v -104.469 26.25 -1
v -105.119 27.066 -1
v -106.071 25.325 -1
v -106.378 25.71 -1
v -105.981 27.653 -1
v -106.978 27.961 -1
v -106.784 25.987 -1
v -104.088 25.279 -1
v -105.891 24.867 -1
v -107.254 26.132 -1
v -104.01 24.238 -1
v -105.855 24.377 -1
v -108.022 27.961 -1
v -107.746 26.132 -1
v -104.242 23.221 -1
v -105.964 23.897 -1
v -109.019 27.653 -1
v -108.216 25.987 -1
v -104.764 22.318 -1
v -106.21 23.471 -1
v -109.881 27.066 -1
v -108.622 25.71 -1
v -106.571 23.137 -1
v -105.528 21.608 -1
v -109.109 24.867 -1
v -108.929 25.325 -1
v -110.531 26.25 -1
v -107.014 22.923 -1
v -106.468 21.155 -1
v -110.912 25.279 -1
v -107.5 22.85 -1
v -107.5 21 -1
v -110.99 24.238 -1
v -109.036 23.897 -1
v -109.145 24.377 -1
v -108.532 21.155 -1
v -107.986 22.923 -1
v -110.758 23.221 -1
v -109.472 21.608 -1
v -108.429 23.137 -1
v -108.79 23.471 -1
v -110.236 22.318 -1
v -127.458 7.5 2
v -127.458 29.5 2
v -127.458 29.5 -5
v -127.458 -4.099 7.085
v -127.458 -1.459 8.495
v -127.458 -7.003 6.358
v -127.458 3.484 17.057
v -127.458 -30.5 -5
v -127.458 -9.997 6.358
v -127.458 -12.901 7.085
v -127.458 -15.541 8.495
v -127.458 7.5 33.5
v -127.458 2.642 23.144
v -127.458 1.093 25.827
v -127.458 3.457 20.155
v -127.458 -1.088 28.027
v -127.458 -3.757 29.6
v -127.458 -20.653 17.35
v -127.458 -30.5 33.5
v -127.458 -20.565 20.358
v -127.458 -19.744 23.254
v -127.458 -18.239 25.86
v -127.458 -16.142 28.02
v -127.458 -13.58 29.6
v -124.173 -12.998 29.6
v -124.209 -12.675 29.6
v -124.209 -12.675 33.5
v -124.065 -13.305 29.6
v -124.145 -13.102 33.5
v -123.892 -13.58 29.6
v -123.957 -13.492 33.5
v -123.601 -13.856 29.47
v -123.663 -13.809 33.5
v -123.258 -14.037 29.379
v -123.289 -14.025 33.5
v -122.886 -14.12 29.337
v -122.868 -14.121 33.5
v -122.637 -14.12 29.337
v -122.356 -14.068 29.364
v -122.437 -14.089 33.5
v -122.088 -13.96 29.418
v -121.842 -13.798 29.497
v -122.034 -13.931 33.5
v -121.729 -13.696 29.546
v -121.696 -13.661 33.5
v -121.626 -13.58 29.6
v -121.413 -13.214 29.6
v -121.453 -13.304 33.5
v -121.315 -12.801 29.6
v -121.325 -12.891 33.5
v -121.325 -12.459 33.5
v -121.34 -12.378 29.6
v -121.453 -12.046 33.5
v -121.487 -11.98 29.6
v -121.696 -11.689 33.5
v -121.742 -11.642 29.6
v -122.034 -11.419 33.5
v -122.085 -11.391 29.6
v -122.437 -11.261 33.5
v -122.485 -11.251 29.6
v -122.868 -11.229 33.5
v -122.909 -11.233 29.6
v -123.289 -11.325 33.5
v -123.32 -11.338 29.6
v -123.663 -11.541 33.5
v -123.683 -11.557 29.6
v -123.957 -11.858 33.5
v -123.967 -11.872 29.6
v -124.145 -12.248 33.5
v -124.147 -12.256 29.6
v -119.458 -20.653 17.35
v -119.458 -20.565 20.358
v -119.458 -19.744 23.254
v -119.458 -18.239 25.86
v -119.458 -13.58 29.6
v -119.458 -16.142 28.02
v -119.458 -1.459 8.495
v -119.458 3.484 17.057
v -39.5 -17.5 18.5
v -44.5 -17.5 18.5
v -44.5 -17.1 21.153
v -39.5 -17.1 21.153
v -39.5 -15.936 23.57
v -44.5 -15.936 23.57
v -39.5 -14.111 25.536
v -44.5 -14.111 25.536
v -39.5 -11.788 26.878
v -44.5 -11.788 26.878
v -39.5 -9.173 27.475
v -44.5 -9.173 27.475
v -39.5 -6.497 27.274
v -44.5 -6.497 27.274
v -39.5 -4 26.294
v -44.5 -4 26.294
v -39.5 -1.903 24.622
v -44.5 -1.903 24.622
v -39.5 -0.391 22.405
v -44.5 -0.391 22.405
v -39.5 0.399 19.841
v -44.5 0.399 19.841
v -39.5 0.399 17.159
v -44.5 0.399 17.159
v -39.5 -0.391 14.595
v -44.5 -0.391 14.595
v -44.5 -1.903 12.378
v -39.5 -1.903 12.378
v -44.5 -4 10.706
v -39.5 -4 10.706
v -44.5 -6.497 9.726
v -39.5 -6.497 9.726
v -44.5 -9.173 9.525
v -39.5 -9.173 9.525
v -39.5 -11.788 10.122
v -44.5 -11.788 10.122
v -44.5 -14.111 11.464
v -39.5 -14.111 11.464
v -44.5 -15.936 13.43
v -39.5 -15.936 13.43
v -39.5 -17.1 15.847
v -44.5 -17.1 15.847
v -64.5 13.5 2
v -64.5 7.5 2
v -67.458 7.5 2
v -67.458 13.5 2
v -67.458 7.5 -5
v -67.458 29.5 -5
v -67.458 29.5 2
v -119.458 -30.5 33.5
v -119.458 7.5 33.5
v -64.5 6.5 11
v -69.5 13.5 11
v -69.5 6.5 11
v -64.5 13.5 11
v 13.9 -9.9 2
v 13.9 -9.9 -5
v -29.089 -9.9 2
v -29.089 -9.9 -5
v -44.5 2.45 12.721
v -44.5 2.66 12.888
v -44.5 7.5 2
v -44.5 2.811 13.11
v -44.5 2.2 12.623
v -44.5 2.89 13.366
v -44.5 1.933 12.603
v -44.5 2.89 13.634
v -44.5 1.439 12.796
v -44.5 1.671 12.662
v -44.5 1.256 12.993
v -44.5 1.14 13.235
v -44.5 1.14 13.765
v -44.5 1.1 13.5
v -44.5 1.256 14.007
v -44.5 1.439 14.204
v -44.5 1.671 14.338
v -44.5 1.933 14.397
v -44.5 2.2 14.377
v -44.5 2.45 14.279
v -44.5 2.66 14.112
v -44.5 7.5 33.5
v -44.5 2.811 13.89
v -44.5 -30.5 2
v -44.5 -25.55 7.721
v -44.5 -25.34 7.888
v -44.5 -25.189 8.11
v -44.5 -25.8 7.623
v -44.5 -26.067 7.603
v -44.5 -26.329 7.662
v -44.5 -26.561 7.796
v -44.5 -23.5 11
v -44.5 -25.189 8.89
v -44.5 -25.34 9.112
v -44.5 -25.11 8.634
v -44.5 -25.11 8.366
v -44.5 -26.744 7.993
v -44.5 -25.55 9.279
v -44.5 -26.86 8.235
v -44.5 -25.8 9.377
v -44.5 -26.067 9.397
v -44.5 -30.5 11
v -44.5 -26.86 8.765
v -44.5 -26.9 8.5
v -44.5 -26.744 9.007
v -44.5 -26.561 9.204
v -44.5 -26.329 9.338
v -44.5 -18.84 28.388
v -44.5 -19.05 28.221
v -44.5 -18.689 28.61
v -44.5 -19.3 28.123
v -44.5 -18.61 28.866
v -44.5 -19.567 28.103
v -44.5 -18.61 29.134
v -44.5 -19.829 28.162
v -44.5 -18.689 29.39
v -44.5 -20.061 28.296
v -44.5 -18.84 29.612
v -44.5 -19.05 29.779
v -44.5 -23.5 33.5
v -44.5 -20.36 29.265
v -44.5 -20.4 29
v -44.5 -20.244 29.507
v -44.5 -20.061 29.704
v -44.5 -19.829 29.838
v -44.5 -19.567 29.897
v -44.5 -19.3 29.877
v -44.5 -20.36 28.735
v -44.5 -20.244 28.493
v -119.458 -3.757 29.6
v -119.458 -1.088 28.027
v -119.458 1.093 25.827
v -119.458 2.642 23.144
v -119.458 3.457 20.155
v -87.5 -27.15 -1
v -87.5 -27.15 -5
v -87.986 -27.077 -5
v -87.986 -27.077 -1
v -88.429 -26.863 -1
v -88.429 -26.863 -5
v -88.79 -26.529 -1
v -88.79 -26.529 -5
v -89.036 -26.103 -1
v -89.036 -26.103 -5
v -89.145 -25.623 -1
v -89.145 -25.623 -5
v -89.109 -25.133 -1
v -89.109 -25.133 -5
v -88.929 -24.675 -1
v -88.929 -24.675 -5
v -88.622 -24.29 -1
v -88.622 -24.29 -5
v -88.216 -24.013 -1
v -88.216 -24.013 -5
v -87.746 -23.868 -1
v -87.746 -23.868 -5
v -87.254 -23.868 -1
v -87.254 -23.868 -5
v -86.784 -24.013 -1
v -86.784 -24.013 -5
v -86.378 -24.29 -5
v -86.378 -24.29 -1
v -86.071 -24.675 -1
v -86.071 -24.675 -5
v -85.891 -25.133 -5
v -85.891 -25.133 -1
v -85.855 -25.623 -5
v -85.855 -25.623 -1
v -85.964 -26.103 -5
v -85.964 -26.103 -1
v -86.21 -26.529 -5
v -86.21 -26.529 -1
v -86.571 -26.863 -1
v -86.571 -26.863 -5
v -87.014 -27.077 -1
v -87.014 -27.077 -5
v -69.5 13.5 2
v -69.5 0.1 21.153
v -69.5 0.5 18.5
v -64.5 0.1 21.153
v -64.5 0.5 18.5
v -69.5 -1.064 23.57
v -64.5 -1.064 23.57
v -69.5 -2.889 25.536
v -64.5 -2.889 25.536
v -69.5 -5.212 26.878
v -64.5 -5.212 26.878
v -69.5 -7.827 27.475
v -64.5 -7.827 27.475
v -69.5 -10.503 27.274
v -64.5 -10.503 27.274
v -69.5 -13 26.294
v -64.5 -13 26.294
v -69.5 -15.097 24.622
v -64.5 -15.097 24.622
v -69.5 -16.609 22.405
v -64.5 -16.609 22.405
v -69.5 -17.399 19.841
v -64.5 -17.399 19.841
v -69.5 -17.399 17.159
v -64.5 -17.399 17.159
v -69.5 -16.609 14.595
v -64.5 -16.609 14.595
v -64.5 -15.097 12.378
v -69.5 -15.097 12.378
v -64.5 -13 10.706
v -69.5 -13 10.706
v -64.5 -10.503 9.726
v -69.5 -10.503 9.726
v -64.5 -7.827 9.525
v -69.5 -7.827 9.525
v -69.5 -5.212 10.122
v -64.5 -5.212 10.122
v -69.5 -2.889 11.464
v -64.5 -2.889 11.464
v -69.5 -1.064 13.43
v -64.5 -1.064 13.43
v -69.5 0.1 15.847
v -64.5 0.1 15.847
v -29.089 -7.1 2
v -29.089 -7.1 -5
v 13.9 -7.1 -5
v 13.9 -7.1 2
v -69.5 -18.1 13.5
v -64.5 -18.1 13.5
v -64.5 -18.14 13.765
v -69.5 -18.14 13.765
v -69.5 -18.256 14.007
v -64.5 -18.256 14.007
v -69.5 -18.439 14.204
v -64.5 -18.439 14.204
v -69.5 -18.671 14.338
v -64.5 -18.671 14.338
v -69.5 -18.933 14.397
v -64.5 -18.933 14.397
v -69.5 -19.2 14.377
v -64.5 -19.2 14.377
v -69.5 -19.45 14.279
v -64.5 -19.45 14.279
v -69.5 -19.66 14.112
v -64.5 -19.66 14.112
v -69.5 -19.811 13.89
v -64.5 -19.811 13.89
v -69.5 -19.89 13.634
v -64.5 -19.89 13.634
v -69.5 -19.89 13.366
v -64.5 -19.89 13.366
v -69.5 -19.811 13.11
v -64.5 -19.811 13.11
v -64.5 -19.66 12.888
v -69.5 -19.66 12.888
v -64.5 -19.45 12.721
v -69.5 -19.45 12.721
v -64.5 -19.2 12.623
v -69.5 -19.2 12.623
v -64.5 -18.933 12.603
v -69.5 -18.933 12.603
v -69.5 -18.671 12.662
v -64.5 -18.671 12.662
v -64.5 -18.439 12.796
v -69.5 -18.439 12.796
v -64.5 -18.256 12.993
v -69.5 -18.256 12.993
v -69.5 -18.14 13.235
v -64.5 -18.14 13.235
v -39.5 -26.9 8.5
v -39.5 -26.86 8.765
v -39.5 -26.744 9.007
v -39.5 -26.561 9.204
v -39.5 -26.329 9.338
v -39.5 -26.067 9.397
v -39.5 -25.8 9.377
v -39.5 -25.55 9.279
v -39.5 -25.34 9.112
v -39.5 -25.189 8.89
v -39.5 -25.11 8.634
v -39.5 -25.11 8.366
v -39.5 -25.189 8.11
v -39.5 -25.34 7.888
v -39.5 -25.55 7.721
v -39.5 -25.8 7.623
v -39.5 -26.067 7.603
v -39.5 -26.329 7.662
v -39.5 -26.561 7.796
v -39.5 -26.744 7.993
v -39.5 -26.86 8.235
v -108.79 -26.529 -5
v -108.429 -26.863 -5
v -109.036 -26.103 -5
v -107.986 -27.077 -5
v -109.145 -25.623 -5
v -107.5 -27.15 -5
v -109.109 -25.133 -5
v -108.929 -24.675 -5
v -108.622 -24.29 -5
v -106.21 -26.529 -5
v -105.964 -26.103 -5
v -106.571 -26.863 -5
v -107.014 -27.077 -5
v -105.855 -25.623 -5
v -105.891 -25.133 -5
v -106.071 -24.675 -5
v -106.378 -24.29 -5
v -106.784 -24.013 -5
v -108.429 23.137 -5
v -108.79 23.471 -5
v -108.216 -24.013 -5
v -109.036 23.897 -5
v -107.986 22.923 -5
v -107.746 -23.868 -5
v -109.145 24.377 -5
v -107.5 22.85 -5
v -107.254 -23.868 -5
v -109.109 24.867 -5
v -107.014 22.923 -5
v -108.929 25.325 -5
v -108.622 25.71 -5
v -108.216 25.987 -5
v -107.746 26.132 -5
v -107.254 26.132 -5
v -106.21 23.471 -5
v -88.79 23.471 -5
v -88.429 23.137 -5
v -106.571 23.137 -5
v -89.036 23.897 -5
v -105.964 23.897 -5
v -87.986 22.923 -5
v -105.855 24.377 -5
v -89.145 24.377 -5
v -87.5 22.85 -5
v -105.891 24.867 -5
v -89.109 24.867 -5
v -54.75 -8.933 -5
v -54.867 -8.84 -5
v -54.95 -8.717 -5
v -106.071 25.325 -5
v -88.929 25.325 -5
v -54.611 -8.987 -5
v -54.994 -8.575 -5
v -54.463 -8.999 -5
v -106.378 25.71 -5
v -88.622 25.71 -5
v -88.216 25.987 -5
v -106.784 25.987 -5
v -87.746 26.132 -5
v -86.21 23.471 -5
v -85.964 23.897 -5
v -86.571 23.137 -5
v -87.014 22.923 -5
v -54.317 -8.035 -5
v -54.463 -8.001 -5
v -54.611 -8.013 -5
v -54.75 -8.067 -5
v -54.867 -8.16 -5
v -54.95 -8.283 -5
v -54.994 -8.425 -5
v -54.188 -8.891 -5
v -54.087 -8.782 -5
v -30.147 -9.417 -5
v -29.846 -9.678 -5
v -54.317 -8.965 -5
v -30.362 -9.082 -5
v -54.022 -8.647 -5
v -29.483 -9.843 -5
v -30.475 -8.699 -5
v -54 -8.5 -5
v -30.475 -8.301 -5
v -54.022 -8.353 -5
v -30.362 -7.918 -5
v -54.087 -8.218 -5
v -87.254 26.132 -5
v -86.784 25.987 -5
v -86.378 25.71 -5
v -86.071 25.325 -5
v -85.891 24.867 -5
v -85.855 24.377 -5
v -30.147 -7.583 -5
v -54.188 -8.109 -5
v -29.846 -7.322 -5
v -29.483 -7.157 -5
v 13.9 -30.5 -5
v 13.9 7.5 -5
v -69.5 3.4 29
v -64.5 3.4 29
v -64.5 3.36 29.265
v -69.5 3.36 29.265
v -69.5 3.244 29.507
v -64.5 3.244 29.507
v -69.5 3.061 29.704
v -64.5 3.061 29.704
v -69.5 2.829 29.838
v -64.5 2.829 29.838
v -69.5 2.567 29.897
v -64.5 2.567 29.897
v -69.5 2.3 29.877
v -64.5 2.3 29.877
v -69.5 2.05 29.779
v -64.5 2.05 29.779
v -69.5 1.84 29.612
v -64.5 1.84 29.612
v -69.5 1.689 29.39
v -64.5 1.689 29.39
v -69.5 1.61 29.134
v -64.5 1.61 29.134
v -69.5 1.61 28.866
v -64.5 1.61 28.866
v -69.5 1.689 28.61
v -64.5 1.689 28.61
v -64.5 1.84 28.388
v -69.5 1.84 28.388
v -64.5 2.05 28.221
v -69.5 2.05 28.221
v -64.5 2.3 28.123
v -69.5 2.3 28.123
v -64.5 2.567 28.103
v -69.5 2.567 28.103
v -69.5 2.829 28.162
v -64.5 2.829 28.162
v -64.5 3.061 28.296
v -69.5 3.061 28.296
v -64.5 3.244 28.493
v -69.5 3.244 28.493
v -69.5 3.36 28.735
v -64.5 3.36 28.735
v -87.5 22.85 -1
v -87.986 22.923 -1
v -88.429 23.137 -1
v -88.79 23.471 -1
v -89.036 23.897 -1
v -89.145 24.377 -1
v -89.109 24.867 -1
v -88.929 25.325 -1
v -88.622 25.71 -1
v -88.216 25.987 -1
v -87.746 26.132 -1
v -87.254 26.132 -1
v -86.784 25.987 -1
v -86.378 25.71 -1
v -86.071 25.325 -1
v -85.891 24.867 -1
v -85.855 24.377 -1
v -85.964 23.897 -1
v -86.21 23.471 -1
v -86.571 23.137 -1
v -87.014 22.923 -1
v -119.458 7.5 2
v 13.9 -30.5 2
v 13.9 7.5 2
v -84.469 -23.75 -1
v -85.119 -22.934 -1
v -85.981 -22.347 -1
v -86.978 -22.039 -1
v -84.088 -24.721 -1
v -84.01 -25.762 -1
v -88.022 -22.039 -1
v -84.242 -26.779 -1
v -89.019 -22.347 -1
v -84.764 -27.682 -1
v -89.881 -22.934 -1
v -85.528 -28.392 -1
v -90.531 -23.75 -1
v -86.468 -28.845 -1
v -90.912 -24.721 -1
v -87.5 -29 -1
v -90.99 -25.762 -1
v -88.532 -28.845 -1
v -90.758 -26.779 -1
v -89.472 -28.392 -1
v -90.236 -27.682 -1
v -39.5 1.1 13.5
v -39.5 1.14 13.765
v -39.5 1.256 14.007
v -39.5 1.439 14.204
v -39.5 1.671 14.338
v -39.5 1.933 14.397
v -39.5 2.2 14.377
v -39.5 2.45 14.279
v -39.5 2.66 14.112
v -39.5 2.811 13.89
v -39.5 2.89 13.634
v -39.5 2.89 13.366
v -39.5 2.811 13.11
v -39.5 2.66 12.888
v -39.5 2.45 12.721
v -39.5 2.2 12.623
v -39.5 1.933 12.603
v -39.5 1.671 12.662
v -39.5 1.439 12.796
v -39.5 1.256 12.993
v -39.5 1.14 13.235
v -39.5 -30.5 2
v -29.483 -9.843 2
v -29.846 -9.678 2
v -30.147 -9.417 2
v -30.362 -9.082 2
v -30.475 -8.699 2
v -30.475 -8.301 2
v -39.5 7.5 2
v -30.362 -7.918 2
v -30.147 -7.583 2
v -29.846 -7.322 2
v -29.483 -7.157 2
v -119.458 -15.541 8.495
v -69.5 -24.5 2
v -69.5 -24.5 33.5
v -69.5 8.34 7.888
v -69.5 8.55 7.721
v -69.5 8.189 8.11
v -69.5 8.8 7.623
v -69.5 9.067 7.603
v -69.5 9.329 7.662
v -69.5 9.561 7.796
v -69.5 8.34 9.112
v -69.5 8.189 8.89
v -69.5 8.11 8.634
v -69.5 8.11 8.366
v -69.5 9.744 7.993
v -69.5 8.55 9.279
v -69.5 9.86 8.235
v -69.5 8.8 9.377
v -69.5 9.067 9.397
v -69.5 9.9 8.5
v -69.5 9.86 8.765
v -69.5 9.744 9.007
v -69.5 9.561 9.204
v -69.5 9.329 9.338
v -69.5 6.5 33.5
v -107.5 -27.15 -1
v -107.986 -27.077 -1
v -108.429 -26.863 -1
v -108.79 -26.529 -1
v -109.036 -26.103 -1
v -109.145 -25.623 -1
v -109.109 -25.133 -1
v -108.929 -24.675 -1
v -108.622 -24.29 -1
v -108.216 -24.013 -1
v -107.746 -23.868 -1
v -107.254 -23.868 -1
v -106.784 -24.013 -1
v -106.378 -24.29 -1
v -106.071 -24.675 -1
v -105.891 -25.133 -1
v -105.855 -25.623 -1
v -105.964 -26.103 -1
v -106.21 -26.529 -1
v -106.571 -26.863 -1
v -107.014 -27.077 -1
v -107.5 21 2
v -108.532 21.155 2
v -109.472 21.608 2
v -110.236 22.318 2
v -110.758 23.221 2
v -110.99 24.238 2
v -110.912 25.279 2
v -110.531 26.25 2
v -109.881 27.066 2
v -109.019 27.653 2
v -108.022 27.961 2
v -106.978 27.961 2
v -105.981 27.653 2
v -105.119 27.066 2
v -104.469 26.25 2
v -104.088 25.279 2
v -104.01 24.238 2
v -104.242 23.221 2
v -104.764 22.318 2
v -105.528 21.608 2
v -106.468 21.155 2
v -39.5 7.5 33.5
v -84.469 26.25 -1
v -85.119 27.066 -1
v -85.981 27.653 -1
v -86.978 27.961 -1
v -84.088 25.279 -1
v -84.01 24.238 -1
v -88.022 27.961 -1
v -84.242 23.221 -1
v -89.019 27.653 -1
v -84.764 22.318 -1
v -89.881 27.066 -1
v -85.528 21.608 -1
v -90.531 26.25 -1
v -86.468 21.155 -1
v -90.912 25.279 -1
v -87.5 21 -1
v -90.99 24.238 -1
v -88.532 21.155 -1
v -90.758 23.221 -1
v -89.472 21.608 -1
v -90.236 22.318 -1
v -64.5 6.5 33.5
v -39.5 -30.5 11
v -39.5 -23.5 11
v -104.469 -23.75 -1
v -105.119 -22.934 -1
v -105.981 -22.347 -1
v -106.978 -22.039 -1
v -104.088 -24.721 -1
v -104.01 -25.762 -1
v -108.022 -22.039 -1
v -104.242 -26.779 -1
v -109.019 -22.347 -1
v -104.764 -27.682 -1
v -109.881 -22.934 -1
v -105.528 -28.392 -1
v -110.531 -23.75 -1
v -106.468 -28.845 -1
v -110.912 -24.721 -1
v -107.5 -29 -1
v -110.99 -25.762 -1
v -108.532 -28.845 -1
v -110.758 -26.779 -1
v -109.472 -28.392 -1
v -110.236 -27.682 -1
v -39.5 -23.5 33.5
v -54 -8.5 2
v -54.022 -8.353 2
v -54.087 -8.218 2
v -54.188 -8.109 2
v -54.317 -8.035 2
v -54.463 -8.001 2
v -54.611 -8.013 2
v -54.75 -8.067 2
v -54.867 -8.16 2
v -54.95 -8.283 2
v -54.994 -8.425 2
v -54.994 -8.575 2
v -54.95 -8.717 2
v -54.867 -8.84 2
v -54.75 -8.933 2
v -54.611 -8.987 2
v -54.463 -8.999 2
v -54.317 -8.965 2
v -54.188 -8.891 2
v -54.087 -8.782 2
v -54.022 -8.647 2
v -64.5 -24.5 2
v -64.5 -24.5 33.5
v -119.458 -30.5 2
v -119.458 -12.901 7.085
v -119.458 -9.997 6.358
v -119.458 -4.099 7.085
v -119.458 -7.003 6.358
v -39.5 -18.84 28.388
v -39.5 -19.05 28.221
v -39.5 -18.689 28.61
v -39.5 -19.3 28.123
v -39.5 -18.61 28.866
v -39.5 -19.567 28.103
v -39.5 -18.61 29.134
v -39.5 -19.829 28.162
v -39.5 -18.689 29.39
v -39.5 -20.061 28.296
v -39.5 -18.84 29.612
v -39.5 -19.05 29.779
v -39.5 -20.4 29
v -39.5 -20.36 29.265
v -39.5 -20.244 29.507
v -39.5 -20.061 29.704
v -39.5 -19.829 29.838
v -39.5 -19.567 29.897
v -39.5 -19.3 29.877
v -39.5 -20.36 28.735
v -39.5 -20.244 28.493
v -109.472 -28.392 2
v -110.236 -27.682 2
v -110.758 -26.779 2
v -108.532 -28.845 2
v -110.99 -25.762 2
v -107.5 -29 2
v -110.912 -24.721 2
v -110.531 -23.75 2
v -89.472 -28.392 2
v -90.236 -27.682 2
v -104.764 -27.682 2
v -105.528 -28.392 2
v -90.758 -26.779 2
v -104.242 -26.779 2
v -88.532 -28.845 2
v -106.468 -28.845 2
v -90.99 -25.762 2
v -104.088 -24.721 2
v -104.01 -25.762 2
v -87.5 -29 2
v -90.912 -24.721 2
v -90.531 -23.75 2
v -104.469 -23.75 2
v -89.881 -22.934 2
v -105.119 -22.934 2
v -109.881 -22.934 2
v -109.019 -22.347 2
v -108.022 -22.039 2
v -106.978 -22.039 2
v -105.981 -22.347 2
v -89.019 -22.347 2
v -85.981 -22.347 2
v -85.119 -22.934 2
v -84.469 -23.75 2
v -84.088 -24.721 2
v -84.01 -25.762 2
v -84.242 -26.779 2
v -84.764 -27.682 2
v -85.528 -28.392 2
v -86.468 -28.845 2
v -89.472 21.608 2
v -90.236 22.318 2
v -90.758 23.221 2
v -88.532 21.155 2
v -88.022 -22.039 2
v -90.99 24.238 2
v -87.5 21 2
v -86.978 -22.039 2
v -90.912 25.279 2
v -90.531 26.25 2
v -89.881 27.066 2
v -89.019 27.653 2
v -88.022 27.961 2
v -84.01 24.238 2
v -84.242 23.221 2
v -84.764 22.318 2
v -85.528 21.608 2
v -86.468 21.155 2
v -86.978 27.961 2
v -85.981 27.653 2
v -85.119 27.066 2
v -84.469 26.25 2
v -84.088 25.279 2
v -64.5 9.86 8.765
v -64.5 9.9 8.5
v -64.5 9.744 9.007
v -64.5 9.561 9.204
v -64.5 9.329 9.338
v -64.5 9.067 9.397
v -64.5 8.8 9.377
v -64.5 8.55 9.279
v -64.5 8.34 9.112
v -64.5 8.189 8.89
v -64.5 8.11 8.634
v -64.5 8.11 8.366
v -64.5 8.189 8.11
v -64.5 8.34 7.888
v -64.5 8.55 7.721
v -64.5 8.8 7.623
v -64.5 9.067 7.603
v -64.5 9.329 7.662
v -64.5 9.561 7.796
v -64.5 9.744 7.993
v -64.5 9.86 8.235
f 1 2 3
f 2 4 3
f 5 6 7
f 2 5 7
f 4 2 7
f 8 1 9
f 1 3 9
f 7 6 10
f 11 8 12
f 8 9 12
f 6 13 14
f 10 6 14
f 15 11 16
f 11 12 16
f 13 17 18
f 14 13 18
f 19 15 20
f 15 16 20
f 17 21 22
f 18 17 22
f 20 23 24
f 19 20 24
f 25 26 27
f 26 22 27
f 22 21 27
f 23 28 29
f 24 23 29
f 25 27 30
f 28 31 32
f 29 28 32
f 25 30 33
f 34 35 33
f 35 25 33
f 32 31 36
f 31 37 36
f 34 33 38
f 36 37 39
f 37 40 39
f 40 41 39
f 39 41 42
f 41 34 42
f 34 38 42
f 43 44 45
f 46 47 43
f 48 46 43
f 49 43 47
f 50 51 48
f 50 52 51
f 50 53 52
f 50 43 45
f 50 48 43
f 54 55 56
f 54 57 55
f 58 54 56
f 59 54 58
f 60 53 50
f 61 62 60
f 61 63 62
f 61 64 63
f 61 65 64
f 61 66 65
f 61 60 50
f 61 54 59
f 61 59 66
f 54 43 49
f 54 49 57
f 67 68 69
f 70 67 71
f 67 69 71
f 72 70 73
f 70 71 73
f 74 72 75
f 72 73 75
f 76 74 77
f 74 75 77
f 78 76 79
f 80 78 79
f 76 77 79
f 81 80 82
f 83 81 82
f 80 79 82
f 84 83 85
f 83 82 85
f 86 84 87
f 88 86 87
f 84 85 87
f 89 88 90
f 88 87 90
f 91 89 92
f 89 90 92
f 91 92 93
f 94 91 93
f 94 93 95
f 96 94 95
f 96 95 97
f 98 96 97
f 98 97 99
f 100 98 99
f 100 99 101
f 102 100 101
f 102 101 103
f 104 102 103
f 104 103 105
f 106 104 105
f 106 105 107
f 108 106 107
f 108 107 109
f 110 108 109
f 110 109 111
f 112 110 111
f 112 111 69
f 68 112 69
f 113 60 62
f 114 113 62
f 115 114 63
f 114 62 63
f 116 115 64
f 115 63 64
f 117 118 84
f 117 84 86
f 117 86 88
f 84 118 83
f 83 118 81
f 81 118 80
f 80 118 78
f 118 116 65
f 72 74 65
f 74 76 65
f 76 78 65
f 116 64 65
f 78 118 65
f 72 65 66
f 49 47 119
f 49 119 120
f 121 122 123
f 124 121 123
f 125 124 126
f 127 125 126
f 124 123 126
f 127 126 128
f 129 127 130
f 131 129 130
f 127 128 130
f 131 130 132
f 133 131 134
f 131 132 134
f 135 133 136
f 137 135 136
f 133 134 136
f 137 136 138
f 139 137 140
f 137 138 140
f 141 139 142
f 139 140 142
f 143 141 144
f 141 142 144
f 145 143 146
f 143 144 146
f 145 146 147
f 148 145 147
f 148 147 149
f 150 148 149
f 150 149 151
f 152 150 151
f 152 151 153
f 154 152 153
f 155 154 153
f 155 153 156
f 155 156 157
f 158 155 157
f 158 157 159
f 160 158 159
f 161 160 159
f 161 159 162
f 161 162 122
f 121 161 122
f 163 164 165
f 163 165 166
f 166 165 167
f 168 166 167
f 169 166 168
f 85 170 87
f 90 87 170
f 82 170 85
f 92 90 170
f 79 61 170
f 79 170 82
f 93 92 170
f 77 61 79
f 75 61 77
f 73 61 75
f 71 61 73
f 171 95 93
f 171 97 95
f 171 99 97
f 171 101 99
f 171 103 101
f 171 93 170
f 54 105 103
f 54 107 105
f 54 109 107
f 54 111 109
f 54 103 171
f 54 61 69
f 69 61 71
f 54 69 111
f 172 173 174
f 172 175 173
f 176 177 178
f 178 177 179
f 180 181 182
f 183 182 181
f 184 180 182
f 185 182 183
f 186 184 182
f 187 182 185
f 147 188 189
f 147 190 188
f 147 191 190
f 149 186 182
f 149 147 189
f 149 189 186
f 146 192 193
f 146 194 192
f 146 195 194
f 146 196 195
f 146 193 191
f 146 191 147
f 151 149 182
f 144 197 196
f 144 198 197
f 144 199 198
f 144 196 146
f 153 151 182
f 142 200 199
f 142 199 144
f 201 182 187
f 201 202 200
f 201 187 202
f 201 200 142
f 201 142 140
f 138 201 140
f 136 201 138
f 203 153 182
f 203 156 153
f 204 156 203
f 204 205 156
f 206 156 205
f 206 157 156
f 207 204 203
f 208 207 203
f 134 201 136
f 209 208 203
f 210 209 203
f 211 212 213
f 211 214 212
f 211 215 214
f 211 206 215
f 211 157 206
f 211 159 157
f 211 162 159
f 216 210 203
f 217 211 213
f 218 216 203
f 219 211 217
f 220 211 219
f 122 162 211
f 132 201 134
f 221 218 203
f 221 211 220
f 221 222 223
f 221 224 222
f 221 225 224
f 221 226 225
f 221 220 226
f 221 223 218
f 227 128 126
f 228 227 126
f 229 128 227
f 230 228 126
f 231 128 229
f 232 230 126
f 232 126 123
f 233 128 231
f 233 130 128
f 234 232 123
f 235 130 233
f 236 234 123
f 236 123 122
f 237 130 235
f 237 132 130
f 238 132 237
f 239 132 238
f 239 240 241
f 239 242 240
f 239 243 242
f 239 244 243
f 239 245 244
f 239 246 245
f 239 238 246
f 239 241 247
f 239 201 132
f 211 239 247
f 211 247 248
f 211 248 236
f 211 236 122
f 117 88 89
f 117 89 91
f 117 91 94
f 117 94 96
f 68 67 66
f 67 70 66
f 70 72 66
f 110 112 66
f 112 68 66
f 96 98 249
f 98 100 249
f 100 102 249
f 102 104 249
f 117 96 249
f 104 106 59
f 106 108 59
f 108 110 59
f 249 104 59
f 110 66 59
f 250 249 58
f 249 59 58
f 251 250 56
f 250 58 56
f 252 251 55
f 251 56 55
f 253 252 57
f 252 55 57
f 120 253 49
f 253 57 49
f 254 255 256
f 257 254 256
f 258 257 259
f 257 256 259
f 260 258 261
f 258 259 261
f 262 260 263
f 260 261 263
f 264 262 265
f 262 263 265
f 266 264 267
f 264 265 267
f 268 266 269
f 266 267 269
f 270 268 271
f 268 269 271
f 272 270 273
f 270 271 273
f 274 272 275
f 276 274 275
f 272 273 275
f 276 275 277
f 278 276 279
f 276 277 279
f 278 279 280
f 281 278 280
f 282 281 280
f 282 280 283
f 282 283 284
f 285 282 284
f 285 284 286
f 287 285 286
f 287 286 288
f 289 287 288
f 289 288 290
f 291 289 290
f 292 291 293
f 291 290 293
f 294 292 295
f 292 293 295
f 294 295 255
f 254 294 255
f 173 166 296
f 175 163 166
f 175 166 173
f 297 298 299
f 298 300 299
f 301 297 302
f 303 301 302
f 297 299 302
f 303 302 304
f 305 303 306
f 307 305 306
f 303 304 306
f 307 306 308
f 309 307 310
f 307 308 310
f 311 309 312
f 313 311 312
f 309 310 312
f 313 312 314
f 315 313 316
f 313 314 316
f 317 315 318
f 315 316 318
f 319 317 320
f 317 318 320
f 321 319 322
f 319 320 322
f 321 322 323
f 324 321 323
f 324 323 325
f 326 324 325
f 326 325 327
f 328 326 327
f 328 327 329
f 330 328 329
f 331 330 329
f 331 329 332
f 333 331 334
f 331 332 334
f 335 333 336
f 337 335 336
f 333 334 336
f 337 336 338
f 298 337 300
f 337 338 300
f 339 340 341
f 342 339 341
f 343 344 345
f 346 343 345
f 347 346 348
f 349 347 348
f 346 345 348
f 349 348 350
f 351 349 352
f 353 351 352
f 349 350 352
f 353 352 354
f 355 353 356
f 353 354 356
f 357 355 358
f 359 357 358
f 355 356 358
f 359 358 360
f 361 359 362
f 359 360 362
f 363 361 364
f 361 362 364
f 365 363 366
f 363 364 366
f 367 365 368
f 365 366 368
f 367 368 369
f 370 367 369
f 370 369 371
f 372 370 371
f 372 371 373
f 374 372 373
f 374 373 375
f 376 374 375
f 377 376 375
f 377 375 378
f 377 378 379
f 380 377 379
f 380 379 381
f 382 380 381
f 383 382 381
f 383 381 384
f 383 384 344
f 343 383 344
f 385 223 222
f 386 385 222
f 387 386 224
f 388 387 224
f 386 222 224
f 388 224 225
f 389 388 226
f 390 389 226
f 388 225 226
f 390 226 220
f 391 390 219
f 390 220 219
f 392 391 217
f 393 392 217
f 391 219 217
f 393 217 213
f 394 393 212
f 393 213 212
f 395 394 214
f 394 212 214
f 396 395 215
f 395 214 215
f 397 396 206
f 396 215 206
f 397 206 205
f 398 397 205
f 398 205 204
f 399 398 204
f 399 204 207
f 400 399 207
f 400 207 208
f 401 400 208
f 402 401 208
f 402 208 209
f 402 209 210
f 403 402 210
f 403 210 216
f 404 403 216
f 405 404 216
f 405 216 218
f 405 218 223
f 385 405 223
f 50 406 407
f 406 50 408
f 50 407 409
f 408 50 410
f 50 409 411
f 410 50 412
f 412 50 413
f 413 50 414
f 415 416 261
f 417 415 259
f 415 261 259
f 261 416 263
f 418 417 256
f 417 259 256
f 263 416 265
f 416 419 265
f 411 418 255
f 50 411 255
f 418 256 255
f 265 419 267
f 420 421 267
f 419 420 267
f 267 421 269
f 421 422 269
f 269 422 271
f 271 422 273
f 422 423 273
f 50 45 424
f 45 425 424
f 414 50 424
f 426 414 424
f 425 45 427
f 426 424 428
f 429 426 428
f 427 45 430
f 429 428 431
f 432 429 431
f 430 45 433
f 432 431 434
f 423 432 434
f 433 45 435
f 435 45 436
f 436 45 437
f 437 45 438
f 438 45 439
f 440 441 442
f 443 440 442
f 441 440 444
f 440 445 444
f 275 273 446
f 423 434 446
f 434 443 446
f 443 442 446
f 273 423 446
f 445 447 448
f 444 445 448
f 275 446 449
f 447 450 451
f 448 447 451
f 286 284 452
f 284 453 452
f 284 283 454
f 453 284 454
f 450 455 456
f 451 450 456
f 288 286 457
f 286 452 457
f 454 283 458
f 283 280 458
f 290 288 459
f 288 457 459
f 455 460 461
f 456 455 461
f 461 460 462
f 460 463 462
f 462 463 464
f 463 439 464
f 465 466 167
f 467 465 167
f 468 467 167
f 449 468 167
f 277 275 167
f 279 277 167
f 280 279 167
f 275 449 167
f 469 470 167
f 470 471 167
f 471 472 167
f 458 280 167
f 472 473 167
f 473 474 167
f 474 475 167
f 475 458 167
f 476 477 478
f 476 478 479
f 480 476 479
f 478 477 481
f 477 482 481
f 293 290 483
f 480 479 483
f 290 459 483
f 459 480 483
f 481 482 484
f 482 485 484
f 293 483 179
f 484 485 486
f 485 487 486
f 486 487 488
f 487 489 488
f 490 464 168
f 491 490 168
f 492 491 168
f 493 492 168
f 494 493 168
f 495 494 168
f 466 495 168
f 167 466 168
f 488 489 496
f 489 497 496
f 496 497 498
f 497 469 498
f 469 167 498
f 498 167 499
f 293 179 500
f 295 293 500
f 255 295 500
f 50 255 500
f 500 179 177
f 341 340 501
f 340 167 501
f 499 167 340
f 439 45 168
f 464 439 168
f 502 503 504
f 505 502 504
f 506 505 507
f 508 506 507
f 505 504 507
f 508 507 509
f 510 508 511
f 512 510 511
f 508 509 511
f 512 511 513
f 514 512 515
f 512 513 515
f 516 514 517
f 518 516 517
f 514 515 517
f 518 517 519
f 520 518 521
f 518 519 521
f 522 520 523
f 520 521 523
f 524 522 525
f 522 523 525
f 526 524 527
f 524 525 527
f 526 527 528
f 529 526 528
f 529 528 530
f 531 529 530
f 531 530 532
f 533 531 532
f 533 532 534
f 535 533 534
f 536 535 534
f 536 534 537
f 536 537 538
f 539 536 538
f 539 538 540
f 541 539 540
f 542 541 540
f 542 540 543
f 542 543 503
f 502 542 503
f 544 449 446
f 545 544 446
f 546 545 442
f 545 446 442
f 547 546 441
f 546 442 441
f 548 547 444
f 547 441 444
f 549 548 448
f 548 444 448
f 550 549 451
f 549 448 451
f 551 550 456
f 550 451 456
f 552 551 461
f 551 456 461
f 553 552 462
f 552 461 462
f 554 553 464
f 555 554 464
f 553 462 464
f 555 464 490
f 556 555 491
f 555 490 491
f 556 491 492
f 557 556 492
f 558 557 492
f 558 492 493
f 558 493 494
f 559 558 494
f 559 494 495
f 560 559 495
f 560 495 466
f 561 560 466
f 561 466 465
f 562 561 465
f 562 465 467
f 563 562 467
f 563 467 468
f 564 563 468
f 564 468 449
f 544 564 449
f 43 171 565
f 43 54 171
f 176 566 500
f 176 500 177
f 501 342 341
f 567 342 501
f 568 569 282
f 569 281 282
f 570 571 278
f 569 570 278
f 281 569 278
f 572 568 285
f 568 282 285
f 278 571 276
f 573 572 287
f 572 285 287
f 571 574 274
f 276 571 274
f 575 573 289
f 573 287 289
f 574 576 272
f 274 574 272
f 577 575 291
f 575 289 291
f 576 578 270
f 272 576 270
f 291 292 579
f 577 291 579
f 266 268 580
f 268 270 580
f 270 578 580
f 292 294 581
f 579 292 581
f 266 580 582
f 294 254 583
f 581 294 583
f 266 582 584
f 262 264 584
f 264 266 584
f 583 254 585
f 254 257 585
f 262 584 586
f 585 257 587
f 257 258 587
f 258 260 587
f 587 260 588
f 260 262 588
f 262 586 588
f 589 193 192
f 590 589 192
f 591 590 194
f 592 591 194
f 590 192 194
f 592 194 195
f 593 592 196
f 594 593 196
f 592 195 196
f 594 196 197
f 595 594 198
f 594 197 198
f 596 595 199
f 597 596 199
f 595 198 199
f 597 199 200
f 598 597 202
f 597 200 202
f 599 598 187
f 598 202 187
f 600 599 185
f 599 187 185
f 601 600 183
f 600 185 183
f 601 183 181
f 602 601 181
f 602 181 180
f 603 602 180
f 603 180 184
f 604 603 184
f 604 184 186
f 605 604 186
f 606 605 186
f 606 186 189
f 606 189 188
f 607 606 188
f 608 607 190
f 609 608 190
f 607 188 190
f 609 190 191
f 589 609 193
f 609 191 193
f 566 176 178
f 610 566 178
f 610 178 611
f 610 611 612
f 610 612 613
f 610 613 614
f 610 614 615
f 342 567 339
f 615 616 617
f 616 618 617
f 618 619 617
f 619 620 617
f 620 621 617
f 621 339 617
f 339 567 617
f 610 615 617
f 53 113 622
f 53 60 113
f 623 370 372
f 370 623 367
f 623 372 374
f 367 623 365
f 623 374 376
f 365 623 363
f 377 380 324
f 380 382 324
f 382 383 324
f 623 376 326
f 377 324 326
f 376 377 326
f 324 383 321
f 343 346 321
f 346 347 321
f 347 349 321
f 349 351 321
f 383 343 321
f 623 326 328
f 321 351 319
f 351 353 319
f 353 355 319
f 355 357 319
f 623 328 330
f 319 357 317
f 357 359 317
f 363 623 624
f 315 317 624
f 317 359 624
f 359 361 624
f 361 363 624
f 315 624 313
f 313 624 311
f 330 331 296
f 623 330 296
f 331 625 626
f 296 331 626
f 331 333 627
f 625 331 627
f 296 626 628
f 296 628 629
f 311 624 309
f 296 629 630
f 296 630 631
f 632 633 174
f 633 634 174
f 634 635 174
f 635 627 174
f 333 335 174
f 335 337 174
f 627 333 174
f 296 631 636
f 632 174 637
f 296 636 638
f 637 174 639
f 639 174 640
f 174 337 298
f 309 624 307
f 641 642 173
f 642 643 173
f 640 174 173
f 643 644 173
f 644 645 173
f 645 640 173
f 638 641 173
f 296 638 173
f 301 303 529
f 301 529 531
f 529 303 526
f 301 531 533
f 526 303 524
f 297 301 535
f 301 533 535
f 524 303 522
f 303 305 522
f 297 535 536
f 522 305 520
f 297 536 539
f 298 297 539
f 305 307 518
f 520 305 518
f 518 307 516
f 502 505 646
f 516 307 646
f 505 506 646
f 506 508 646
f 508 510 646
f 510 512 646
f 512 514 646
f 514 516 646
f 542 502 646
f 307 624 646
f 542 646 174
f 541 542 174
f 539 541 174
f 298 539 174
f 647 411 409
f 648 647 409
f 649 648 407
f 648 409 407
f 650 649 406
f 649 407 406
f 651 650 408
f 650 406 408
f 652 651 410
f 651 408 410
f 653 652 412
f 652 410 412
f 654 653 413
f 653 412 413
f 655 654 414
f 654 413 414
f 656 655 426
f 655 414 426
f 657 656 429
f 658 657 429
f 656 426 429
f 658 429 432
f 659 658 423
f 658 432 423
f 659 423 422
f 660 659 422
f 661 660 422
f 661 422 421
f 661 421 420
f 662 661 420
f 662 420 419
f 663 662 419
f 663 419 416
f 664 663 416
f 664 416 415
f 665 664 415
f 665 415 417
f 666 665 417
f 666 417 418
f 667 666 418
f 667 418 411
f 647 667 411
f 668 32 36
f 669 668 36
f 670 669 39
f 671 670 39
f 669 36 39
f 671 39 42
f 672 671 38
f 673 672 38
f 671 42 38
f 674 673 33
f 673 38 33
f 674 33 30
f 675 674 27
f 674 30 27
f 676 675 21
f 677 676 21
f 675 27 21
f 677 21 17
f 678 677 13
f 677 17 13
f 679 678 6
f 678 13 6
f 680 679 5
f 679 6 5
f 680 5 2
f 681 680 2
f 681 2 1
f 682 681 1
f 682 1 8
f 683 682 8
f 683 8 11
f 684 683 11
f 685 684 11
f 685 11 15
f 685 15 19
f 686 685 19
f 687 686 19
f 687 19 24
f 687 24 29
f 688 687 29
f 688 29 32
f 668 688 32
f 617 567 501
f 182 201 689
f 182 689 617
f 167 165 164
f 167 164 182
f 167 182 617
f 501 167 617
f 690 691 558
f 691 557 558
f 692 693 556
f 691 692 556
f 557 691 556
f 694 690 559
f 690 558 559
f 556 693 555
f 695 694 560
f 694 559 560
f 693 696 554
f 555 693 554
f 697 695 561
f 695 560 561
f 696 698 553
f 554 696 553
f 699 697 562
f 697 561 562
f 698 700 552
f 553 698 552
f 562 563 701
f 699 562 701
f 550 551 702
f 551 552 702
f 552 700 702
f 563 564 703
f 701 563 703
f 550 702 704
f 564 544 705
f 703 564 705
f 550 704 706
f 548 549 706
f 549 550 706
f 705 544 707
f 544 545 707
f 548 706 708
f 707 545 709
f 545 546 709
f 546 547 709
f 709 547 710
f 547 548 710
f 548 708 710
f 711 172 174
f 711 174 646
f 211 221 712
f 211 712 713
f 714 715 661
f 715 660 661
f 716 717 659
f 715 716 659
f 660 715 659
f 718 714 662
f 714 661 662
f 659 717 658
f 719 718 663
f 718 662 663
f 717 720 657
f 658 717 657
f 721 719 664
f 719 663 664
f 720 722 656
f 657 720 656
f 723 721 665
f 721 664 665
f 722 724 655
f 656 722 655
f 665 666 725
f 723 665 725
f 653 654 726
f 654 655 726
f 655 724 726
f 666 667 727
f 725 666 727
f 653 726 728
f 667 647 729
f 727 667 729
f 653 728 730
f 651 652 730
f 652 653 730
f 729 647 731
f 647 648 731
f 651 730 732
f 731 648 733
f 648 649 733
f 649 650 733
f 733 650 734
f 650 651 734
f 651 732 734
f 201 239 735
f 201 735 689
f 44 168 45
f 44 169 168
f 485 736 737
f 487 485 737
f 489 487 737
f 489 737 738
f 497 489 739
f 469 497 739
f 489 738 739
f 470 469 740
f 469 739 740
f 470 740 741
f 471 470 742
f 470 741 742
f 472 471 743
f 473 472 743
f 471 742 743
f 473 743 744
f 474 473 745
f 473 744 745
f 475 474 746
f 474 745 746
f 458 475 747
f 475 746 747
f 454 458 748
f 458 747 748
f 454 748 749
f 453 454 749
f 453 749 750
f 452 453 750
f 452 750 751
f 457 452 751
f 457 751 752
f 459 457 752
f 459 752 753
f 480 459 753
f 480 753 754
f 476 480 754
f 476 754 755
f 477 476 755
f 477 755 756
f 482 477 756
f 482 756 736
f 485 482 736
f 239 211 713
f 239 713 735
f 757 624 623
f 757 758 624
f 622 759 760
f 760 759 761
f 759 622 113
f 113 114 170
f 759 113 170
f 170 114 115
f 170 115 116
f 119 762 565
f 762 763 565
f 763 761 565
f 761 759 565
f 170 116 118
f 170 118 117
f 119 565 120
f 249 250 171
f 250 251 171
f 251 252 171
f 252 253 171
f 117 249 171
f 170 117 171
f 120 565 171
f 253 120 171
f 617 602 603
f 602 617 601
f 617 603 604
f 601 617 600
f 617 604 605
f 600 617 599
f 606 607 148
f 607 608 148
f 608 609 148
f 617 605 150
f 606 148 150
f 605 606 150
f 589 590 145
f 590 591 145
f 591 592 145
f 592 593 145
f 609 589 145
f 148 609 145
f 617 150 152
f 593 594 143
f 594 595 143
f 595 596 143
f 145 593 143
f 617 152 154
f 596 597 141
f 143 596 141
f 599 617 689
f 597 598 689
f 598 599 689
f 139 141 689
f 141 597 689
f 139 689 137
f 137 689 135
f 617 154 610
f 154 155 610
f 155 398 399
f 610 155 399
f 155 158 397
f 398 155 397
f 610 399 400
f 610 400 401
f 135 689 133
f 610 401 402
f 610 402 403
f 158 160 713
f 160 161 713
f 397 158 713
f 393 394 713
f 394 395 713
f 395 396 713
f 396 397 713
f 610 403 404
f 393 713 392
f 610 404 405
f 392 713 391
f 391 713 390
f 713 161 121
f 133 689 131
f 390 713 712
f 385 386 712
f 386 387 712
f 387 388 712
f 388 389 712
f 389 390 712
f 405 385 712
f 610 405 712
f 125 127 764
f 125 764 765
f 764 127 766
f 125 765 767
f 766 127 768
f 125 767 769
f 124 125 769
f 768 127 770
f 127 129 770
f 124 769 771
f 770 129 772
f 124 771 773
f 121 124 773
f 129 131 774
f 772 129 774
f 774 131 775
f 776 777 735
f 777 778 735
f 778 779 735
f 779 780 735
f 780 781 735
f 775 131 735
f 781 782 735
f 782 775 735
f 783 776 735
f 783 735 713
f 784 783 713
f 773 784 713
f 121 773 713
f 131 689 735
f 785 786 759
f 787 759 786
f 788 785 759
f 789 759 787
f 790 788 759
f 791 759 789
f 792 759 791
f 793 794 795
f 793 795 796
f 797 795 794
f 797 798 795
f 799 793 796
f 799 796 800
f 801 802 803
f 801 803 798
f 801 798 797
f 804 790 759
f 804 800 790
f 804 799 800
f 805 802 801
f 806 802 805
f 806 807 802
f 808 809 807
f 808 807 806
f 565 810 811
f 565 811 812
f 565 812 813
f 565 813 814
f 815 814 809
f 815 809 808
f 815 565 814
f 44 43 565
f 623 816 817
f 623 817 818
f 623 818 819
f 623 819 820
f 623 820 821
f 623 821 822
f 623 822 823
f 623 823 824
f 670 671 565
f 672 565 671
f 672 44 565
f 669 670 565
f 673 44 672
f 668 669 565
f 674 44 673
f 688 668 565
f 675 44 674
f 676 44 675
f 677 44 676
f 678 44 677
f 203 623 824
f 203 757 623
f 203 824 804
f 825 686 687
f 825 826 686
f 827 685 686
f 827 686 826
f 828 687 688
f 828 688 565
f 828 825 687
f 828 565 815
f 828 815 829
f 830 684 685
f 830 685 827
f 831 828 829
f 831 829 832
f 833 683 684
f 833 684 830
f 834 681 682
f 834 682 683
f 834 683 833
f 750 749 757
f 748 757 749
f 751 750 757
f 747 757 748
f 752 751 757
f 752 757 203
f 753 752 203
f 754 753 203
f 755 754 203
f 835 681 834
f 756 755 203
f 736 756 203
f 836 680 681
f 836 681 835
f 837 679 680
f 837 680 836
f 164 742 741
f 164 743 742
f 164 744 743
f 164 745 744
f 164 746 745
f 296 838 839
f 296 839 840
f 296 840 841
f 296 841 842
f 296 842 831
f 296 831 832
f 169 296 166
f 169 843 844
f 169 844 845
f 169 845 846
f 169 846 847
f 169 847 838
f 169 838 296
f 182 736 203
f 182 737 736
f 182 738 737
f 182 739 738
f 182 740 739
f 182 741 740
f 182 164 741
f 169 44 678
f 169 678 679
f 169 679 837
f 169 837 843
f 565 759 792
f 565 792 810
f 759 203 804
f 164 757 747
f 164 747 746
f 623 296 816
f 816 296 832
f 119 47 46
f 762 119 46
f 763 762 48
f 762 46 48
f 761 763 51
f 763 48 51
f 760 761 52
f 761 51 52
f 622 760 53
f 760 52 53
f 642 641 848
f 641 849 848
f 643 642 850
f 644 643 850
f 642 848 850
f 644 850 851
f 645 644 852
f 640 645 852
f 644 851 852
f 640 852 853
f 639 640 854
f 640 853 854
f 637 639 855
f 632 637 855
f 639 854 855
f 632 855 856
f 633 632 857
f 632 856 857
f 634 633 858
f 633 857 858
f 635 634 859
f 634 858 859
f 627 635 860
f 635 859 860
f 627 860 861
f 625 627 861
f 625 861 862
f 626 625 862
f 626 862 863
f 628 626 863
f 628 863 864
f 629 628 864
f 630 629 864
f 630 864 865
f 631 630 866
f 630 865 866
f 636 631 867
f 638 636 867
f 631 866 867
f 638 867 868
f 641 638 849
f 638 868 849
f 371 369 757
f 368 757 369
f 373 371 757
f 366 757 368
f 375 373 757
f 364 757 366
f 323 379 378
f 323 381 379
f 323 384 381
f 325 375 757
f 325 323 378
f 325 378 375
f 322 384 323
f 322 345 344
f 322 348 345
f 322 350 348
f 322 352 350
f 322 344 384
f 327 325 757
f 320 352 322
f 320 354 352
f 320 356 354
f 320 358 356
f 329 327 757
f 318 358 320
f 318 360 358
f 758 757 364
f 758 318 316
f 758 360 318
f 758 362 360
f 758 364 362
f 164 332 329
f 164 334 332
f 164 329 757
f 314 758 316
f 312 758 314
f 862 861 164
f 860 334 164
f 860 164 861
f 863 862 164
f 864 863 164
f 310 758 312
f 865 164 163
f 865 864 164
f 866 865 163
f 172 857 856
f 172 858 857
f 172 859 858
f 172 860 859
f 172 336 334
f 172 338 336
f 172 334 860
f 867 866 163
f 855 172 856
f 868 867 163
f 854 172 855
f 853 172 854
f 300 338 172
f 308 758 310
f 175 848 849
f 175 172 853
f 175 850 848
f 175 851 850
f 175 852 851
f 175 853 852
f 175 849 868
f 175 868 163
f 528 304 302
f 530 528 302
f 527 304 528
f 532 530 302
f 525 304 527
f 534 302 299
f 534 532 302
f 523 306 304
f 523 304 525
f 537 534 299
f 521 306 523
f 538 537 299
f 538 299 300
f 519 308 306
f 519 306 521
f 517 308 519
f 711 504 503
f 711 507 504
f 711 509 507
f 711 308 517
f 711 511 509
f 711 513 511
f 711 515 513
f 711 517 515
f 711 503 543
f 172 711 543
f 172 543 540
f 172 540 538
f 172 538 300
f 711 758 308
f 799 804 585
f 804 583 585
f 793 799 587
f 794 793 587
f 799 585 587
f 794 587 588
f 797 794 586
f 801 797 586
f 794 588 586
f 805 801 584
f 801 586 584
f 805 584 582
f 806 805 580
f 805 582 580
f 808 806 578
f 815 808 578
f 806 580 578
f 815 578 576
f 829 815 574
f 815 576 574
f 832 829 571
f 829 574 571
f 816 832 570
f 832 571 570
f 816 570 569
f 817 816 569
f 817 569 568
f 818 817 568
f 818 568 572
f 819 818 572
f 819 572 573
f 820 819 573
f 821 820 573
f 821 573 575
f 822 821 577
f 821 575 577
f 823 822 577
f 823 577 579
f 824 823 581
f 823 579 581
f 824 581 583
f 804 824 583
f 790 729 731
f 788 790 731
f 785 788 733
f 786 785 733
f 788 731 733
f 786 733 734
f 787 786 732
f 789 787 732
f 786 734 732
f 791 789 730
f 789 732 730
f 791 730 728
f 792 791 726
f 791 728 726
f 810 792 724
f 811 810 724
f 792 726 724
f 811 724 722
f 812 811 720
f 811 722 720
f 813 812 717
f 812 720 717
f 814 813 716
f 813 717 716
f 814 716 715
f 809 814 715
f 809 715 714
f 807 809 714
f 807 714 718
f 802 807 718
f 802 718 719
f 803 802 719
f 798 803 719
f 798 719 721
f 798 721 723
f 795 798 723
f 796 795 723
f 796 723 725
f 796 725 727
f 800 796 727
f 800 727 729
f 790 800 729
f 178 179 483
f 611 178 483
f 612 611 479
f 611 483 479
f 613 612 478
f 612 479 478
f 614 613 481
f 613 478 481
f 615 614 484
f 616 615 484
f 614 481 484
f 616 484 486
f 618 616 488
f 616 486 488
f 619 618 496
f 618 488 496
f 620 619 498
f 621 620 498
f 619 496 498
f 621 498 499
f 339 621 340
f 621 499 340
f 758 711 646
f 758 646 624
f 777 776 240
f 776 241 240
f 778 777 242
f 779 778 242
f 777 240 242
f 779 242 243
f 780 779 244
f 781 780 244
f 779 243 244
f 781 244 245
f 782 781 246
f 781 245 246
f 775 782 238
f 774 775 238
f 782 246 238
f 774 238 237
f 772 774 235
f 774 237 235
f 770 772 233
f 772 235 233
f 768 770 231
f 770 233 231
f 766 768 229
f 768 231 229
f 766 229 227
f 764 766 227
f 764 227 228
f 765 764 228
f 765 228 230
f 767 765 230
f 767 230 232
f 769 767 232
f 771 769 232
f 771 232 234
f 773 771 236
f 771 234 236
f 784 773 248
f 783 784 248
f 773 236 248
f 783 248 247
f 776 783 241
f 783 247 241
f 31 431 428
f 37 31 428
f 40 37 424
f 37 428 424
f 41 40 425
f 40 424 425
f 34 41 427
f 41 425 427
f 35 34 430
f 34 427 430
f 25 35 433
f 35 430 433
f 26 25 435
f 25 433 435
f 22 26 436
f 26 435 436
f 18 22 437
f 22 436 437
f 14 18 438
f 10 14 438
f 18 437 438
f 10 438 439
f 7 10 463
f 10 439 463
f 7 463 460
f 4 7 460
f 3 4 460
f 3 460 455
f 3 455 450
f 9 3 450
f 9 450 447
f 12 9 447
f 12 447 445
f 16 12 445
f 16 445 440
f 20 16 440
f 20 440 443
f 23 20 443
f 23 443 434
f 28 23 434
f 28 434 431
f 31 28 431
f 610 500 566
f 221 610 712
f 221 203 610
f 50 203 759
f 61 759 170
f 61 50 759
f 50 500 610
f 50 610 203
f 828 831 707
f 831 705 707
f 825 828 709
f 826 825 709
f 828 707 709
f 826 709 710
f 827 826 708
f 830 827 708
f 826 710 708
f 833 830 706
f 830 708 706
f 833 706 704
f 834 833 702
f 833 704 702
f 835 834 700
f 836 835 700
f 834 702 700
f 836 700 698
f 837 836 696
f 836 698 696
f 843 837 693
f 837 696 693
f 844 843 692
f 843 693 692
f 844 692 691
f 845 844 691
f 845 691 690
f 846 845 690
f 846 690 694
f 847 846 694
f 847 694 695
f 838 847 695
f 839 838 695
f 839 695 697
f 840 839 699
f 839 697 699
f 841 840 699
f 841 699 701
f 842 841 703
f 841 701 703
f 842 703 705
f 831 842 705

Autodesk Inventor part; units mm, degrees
ref_plane "YZ Plane" through (0, 0, 0) normal (1, 0, 0) x (0, 1, 0)
ref_plane "Work Plane10" through (-44.5, -14.2241, 18.7548) normal (1, 0, 0) x (0, -0.9087, 0.4175)
ref_plane "Work Plane11" through (-44.5, -8.5, 18.5) normal (-1, 0, 0) x (0, -1, 0)
sketch "Sketch9" plane through (-44.5, -8.5, 18.5) normal (-1, 0, 0) x (0, -1, 0)
  line L0 (16.8555, -12.7) -> (20, -12.7) construction
  circle A0 centre (17.5, -10) radius 1 construction
  circle A1 centre (11, 10.5) radius 1 construction
  circle A2 centre (-10.5, -5) radius 1 construction
  circle A3 centre (0, 0) radius 2.4142 construction
  line L1 (-15, 15) -> (15, 15) construction
  line L2 (16, -16) -> (-16, -16) construction
  line L3 (15, 15) -> (15, -15) construction
  line L4 (16, 16) -> (16, -16) construction
  line L5 (-16, -16) -> (-16, 16) construction
  line L6 (15, 15) -> (-16, 15)
  line L7 (-16, 15) -> (-16, -16.5)
  line L8 (-16, -16.5) -> (15, -16.5)
  line L9 (15, -16.5) -> (15, 15)
  circle A4 centre (11, 10.5) radius 0.9
  circle A5 centre (17.5, -10) radius 0.9
  circle A6 centre (-10.5, -5) radius 0.9
  circle A7 centre (0, 0) radius 9
  line L10 (15, -16.5) -> (22, -16.5)
  line L11 (22, -16.5) -> (22, -7.5)
  line L12 (22, -7.5) -> (15, -7.5)
  line L13 (15, -7.5) -> (15, -16.5)
  point P0 (-8.5, -18.5)
  dimension "d34" = 31.5
  dimension "d35" = 1.8
  dimension "d36" = 1.8
  dimension "d37" = 1.8
  dimension "d38" = 18
  dimension "d39" = 7
  dimension "d40" = 9
extrude "Extrusion7" add sketch "Sketch9" against normal blind 5
ref_plane "Work Plane12" through (-127.4584, -23.859, -5) normal (0, 0, 1) x (1, 0, 0)
sketch "Sketch10" plane through (-44.5, -30.5, 2) normal (0, 0, -1) x (-1, 0, 0)
  line L0 (0, 0) -> (0, 38) projected
  line L1 (0, 38) -> (-5, 38) projected
  line L2 (-5, 0) -> (-5, 38) projected
  line L3 (0, 0) -> (-5, 0) projected
  circle A0 centre (-19, 22) radius 1.4
  circle A1 centre (-57, 22) radius 1.4
  line L4 (82.9584, 8.641) -> (82.9584, 51.641)
  line L5 (-58.4, 38) -> (82.9584, 38)
  line L6 (82.9584, 38) -> (82.9584, 0)
  line L7 (82.9584, 0) -> (-58.4, 0)
  line L8 (-58.4, 0) -> (-58.4, 38)
  line L9 (-63.3254, 22) -> (-14.2903, 22) construction
  line L10 (-61.7754, 20.45) -> (-15.8403, 20.45)
  line L11 (-15.8403, 23.55) -> (-61.7754, 23.55)
  arc A2 (-61.7754, 23.55) -> (-61.7754, 20.45) centre (-61.7754, 22) ccw
  arc A3 (-15.8403, 20.45) -> (-15.8403, 23.55) centre (-15.8403, 22) ccw
  point P0 (-44.5, 30.5)
  point P1 (-38.8079, 22)
  dimension "d43" = 3.1
extrude "Extrusion8" add sketch "Sketch10" along normal up to surface (7 mm away) contours L3 L2 L1 L0 | L0 L5 L4 L6 L7 | L7 L8 L10 A3 L11 L5 L2 | L8 L11 A3 L10
sketch "Sketch11" plane through (-44.5, -30.5, -5) normal (0, 0, -1) x (-1, 0, 0)
  circle A0 centre (-57, 22) radius 1.4 projected
  circle A1 centre (-19, 22) radius 1.4 projected
  line L0 (-61.4468, 22) -> (-14.0111, 22) construction
  line L1 (-60.0468, 20.6) -> (-15.4111, 20.6)
  line L2 (-15.4111, 23.4) -> (-60.0468, 23.4)
  arc A2 (-60.0468, 23.4) -> (-60.0468, 20.6) centre (-60.0468, 22) ccw
  arc A3 (-15.4111, 20.6) -> (-15.4111, 23.4) centre (-15.4111, 22) ccw
  point P0 (-44.5, 30.5)
  point P1 (-58.4, 22)
  point P2 (-37.729, 22)
extrude "Extrusion9" cut sketch "Sketch11" against normal through all contours A0 | A0 L2 A1 L1 | A0 L1 A2 L2 | L2 A3 L1 A1
ref_plane "Work Plane13" through (-99.5, -8.5, 18.5) normal (-1, 0, 0) x (0, 0, 1)
sketch "Sketch12" plane through (-127.4584, -8.5, 18.5) normal (-1, 0, 0) x (0, 0, 1)
  circle A0 centre (0, 0) radius 10.125
  line L0 (-31.5, -12.684) -> (-23.5, -12.684)
  line L1 (-1.4, 6.6) -> (-6.6, 6.6)
  line L2 (-23.5, -22) -> (-23.5, 16) projected
  line L3 (-16.5, -22) -> (-23.5, -22) projected
  line L4 (-16.5, 16) -> (-16.5, -22) projected
  line L5 (-16.5, 16) -> (-23.5, 16) projected
  line L6 (15, 15) -> (15, -15)
  line L7 (-16.5, -22) -> (15, -22)
  line L8 (15, -22) -> (15, 16)
  line L9 (15, 16) -> (-16.5, 16)
  line L10 (-16.5, 16) -> (-16.5, -22)
  circle A1 centre (0, 0) radius 11.1
  line L11 (11.1, -5.0801) -> (11.1, 4.7426)
  line L12 (-1.1505, -12.1529) -> (-10.0048, -7.0409)
  line L13 (-10.0048, 7.0409) -> (-1.4428, 11.9842)
  arc A2 (-1.1505, -12.1529) -> (11.1, -5.0801) centre (0, 0) ccw
  arc A3 (11.1, 4.7426) -> (-1.4428, 11.9842) centre (0, 0) ccw
  arc A4 (-10.0048, 7.0409) -> (-10.0048, -7.0409) centre (0, 0) ccw
  point P0 (-18.5, 8.5)
  dimension "d51" = 60
  dimension "d52" = 60
  dimension "d73" = 22.2
extrude "Extrusion10" add sketch "Sketch12" against normal blind 8 contours L4 L9 L8 L6 L7
sketch "Sketch13" plane through (-127.4584, -30.5, 33.5) normal (0, 0, 1) x (-1, 0, 0)
  line L0 (0, -38) -> (0, 0) projected
  line L1 (0, -38) -> (-8, -38) projected
  line L2 (-8, -38) -> (-8, 0) projected
  line L3 (0, 0) -> (-8, 0) projected
  line L4 (6.7208, 32.125) -> (-12.4892, 32.125)
  circle A0 centre (-4.6991, -17.8249) radius 1.45
  point P0 (-127.4584, -30.5)
  dimension "d55" = 2.9
extrude "Extrusion11" cut sketch "Sketch13" against normal blind 8 contours A0
sketch "Sketch14" plane through (-44.5, -30.5, 2) normal (0, 0, 1) x (1, 0, 0)
  circle A0 centre (-63, 55) radius 1.45
  circle A1 centre (-43, 55) radius 1.45
  line L0 (-82.9584, 38) -> (-74.9584, 38) projected
  line L1 (-82.9584, 38) -> (58.4, 38) projected
  line L2 (-82.9584, 38) -> (-22.9584, 38)
  line L3 (-22.9584, 38) -> (-22.9584, 60)
  line L4 (-22.9584, 60) -> (-82.9584, 60)
  line L5 (-82.9584, 60) -> (-82.9584, 38)
  point P0 (44.5, 30.5)
  dimension "d71" = 60
  dimension "d72" = 22
ref_plane "Work Plane14" through (-127.4584, -23.859, -5) normal (0, 0, 1) x (1, 0, 0)
extrude "Extrusion12" add sketch "Sketch14" against normal up to surface (7 mm away)
sketch "Sketch15" plane through (-44.5, -30.5, 2) normal (0, 0, 1) x (1, 0, 0)
  line L0 (0, 38) -> (-22.9584, 38) projected
  line L1 (-82.9584, 60) -> (-82.9584, 38) projected
  line L2 (-74.9584, 0) -> (0, 0) projected
  line L3 (0, 0) -> (0, 38) projected
  line L4 (58.4, 20.6) -> (15.4111, 20.6) projected
  arc A0 (15.4111, 23.4) -> (15.4111, 20.6) centre (15.4111, 22) ccw projected
  line L5 (15.4111, 23.4) -> (58.4, 23.4) projected
  line L6 (58.4, 23.4) -> (58.4, 38) projected
  line L7 (5, 0) -> (5, 38) projected
  line L8 (5, 0) -> (58.4, 0) projected
  line L9 (58.4, 0) -> (58.4, 20.6) projected
  line L10 (-22.9584, 38) -> (-22.9584, 60) projected
  line L11 (-22.9584, 60) -> (-82.9584, 60) projected
  circle A1 centre (-63, 5) radius 1.45
  circle A2 centre (-43, 5) radius 1.45
  circle A3 centre (-43, 55) radius 1.45 projected
  circle A4 centre (-63, 55) radius 1.45 projected
  line L12 (58.4, 38) -> (5, 38) projected
  line L13 (-74.9584, 38) -> (-74.9584, 0) projected
  line L14 (-74.9584, 38) -> (-82.9584, 38) projected
  point P0 (44.5, 30.5)
  point P1 (-42.9584, 11.641)
  point P2 (-62.9584, 11.641)
hole "Hole3" at (-107.5, -25.5, 2) at (-87.5, -25.5, 2) at (-107.5, 24.5, 2) at (-87.5, 24.5, 2) direction (0, 0, -1) diameter 3.3 end through all counterbore diameter 7 counterbore depth 3
ref_plane "Work Plane15" through (-53.5, -8.5, 18.5) normal (-1, 0, 0) x (0, 0, 1)
sketch "Sketch17" plane through (-44.5, -30.5, 2) normal (0, 0, 1) x (1, 0, 0)
  circle A0 centre (-63, 55) radius 3.5 projected
  circle A1 centre (-63, 5) radius 3.5 projected
  circle A2 centre (-43, 5) radius 3.5 projected
  circle A3 centre (-43, 55) radius 3.5 projected
  line L0 (-74.9584, 0) -> (0, 0) projected
  line L1 (0, 0) -> (0, 38) projected
  line L2 (0, 38) -> (-22.9584, 38) projected
  line L3 (-22.9584, 38) -> (-22.9584, 60) projected
  line L4 (-22.9584, 60) -> (-82.9584, 60) projected
  line L5 (-82.9584, 60) -> (-82.9584, 38) projected
  line L6 (5, 31) -> (5, 13) projected
  line L7 (0, 13) -> (0, 31) projected
  circle A4 centre (-10, 22) radius 0.5
  line L8 (58.4, 20.6) -> (15.4111, 20.6) projected
  arc A5 (15.4111, 23.4) -> (15.4111, 20.6) centre (15.4111, 22) ccw projected
  line L9 (15.4111, 23.4) -> (58.4, 23.4) projected
  line L10 (58.4, 23.4) -> (58.4, 38) projected
  line L11 (5, 0) -> (5, 38) projected
  line L12 (5, 0) -> (58.4, 0) projected
  line L13 (58.4, 0) -> (58.4, 20.6) projected
  line L14 (58.4, 38) -> (5, 38) projected
  line L15 (-74.9584, 38) -> (-74.9584, 0) projected
  line L16 (-74.9584, 38) -> (-82.9584, 38) projected
  point P0 (44.5, 30.5)
  dimension "d78" = 1
  dimension "d85" = 10
extrude "Extrusion14" cut sketch "Sketch17" against normal blind 10 contours A4
pattern_circular "Circular Pattern1" count 2 over 360 about axis through (-54.5, -8.5, 2) along (0, 0, -1) of "Extrusion7"
properties part number "cellSTORM_inverted_Laser_10x_laserscanner_left_v2"
